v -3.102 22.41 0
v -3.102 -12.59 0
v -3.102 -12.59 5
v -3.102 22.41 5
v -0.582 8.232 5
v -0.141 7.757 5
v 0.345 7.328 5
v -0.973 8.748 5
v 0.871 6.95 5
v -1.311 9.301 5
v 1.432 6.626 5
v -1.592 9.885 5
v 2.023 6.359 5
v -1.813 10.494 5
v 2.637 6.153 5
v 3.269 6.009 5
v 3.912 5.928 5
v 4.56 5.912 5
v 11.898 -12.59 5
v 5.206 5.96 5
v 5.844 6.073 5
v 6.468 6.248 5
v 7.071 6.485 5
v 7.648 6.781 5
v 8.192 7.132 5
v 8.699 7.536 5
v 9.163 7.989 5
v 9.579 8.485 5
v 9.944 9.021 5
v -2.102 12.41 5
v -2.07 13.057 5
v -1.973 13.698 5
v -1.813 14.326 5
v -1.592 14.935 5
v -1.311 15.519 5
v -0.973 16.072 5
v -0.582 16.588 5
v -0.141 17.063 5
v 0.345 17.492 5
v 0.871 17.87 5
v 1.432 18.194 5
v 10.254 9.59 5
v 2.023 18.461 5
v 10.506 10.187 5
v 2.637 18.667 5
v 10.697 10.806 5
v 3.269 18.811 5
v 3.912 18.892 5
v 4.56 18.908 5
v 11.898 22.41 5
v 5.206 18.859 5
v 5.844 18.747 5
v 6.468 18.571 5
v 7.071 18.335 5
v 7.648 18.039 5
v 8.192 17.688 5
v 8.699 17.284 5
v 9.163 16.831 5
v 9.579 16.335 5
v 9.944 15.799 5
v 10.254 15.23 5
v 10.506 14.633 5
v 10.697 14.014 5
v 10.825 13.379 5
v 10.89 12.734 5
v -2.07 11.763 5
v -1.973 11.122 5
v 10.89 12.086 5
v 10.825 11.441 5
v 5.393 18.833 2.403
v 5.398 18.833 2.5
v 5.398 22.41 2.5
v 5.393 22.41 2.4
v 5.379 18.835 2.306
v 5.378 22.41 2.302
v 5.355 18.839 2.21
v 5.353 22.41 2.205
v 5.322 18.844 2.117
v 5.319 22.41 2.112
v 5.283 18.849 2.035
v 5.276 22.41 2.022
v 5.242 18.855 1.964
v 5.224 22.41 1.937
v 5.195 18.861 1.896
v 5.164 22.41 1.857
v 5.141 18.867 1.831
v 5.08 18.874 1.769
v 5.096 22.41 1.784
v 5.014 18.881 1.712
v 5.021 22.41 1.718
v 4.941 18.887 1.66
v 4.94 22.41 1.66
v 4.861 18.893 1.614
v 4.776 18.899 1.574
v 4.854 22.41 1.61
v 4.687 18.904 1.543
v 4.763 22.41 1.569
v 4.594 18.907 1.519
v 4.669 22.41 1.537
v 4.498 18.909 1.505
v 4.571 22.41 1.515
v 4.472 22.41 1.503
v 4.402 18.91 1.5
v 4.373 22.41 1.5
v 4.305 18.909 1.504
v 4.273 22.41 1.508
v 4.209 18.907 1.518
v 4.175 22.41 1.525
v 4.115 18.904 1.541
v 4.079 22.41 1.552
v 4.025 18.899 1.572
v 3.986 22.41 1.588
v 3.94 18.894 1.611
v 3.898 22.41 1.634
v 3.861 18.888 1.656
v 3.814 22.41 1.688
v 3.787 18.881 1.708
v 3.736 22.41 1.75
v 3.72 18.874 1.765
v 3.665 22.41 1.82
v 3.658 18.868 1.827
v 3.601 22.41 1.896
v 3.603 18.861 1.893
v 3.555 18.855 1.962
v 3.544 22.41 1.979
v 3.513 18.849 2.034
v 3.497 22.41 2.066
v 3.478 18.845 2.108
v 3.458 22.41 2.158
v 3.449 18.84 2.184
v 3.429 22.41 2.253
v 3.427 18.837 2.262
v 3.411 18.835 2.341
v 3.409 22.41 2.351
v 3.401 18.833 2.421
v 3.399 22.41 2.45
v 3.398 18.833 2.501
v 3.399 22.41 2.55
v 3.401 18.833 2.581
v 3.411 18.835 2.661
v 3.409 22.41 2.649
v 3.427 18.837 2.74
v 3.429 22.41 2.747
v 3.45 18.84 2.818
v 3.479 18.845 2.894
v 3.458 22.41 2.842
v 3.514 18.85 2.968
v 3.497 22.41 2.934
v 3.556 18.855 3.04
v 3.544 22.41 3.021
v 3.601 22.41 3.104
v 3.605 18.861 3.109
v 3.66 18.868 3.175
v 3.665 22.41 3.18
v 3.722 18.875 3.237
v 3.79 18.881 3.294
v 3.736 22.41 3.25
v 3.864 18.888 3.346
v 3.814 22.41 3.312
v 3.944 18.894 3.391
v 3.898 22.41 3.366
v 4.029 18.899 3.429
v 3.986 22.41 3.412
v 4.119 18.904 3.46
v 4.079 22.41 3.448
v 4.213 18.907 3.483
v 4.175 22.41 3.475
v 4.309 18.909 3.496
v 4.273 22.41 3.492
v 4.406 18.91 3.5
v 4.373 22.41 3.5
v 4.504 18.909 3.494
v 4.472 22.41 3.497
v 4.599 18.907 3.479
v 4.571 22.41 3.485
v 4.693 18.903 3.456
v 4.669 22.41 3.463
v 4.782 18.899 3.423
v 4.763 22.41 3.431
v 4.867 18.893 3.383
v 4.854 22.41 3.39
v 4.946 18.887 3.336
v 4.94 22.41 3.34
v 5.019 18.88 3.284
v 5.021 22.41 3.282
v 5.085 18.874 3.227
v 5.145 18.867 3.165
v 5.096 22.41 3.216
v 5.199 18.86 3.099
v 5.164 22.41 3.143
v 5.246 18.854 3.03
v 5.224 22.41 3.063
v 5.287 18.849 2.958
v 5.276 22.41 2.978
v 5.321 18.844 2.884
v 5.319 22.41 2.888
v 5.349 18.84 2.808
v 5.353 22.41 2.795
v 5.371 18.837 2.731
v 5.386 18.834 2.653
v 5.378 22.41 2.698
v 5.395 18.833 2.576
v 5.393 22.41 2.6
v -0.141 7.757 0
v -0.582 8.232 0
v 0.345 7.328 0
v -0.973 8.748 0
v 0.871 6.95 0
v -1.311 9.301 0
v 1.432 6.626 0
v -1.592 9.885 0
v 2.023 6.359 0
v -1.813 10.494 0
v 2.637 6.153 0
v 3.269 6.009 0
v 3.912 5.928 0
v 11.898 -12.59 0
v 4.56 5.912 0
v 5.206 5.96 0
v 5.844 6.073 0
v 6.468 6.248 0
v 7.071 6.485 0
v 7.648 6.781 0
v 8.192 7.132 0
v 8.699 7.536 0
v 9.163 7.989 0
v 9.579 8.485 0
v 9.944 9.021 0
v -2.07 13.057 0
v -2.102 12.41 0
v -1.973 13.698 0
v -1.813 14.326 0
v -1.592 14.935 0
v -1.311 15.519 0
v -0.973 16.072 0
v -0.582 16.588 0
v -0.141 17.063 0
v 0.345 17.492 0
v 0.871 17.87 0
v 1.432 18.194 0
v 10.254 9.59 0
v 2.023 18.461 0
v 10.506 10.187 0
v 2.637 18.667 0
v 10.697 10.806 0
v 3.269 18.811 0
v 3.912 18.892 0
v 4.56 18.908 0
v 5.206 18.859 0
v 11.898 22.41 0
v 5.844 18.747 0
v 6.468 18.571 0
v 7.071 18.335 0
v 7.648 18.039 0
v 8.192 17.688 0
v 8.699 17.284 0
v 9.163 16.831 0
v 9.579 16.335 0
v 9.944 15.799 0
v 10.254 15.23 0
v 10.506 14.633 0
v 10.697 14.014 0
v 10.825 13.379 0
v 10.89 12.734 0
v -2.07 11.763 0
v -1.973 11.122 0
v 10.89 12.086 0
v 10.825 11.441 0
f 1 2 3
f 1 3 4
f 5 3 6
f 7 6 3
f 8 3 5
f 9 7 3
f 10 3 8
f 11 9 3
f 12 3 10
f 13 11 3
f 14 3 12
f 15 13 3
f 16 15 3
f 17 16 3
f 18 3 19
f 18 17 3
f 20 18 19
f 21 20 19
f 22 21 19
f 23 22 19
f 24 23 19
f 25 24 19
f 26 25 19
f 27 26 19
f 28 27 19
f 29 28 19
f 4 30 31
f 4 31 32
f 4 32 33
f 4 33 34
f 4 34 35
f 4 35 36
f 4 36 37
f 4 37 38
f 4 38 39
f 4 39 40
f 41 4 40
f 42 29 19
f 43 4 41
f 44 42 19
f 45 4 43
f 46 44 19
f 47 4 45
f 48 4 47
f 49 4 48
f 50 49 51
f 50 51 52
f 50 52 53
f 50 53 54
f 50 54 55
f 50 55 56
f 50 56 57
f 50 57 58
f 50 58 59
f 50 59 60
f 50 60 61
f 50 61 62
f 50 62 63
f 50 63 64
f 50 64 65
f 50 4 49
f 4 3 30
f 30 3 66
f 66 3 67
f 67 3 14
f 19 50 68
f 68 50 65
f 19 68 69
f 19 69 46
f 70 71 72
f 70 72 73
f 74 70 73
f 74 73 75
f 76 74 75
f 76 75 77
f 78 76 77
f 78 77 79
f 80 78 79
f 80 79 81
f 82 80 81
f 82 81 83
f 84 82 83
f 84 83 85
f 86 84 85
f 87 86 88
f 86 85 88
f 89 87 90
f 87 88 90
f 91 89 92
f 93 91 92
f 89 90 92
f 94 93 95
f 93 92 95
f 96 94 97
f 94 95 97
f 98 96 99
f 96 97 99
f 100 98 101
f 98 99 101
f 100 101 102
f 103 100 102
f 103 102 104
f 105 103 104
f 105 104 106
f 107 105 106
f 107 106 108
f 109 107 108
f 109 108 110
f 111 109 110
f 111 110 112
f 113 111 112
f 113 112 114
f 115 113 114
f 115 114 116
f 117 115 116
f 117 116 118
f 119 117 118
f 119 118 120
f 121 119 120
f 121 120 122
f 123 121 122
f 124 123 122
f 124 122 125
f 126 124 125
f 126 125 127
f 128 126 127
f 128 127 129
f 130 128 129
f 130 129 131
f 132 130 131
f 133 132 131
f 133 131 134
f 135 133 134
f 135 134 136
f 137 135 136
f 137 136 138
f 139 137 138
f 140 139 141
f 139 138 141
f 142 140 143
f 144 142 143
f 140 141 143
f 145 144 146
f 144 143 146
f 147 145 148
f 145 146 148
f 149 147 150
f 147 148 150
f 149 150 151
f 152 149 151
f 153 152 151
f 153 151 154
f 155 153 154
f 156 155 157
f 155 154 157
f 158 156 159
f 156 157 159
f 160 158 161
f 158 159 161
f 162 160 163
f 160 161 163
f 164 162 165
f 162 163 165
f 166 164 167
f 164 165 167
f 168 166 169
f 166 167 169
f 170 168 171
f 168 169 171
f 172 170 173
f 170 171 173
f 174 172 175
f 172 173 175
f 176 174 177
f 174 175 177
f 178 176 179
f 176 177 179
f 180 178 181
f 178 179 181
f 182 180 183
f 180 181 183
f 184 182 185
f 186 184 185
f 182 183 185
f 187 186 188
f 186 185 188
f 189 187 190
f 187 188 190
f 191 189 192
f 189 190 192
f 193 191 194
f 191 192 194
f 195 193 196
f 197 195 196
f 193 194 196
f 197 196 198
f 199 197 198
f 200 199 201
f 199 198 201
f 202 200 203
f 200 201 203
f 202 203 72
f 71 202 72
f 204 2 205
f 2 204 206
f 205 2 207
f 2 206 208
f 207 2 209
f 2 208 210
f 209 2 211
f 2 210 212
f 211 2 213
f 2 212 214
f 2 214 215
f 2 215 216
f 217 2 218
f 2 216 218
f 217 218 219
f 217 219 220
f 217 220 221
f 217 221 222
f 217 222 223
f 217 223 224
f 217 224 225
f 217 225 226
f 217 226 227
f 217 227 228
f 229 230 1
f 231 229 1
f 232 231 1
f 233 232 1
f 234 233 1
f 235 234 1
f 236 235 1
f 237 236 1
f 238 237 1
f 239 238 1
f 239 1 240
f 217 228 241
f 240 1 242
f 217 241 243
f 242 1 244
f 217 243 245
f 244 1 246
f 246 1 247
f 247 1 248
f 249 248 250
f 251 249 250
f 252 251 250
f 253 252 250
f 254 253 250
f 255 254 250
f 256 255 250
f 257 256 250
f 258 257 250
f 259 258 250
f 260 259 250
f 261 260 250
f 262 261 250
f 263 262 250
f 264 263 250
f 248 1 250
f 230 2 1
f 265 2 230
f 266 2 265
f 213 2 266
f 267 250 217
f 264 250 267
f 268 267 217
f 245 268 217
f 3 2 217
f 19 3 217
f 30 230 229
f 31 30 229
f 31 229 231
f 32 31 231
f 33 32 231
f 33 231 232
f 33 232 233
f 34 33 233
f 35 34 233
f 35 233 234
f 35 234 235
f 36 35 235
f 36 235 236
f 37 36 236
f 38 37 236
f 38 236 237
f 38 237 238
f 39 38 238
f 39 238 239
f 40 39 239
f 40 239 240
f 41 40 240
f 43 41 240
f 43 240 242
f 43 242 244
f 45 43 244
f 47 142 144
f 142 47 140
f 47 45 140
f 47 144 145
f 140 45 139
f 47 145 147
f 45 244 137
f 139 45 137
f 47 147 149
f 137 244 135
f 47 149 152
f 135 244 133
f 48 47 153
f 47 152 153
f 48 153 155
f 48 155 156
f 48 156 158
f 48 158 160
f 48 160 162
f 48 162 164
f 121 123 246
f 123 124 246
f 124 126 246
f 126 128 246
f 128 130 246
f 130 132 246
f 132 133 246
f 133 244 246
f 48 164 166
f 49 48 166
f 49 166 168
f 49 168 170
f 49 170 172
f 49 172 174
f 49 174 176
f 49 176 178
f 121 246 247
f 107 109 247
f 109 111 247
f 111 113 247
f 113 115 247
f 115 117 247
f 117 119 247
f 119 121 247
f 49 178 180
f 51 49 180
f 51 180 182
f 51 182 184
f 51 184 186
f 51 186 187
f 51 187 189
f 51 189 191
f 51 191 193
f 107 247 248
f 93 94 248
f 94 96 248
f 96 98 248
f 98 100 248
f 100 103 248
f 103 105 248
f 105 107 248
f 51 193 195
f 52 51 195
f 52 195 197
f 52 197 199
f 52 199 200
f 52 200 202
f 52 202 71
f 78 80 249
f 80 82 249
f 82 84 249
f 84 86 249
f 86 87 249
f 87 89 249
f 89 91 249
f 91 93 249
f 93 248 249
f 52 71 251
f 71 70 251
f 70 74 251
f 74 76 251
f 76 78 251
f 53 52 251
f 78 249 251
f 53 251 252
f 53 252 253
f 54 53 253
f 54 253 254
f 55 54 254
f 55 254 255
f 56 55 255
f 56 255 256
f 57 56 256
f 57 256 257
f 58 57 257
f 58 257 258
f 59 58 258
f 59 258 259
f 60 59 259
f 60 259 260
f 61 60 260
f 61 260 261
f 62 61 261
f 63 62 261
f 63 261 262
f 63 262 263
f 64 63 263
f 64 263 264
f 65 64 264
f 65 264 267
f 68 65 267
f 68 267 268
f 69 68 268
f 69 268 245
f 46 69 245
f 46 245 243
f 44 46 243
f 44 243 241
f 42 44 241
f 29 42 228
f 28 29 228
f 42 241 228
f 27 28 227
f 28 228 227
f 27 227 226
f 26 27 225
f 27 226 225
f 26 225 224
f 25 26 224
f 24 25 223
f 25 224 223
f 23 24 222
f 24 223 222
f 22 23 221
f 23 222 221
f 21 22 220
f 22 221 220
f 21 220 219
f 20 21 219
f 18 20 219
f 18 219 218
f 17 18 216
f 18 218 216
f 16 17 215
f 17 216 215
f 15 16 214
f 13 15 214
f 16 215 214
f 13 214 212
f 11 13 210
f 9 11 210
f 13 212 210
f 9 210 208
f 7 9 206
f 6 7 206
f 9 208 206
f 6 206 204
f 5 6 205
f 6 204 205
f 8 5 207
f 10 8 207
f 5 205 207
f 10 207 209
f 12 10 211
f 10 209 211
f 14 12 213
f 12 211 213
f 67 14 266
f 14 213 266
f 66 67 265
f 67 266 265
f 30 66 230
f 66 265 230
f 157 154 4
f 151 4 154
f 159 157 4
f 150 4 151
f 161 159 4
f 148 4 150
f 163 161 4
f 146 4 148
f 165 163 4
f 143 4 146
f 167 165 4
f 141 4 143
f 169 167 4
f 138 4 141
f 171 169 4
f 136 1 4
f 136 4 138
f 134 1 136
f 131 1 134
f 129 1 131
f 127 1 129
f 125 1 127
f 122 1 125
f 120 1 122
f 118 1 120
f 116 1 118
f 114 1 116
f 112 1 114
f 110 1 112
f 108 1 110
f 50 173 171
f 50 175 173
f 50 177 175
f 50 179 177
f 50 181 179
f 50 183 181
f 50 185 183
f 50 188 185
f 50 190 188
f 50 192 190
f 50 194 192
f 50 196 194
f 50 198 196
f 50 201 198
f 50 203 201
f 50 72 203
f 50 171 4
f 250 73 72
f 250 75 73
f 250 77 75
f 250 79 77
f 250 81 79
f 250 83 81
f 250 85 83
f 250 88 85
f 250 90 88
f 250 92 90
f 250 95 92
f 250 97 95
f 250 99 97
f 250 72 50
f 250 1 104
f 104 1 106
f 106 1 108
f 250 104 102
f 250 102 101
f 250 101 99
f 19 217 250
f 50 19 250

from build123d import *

# Parameters (mm, degrees)
SKETCH1_W           = 15
SKETCH1_H           = 35
BOSS_EXTRUDE1_DEPTH = 5
SKETCH2_R           = 6.5
CUT_EXTRUDE1_DEPTH  = 5
CUT_EXTRUDE2_REACH  = 37
SKETCH3_R           = 1


with BuildPart() as part:
    # Sketch1 → Boss-Extrude1 (new body)
    with BuildSketch(Plane.XY):
        with Locations((4.397758993, 4.909943839)):
            Rectangle(SKETCH1_W, SKETCH1_H)
    extrude(amount=BOSS_EXTRUDE1_DEPTH)

    # Sketch2 → Cut-Extrude1 (cut)
    with BuildSketch(Plane(origin=(0, 0, 0), x_dir=(-1, 0, 0), z_dir=(0, 0, -1))):
        with Locations((-4.397758993, 12.409943839)):
            Circle(SKETCH2_R)
    extrude(amount=-CUT_EXTRUDE1_DEPTH, mode=Mode.SUBTRACT)

    # Sketch3 → Cut-Extrude2 (cut, up to next)
    with BuildSketch(Plane(origin=(0, 22.409943839, 0), x_dir=(1, 0, 0), z_dir=(0, 1, 0)), mode=Mode.PRIVATE) as cut_extrude2_sk1:
        with Locations((4.397758993, -2.5)):
            Circle(SKETCH3_R)
    cut_extrude2_tool1 = extrude(cut_extrude2_sk1.sketch, amount=-CUT_EXTRUDE2_REACH, mode=Mode.PRIVATE) & part.part
    add(cut_extrude2_tool1.solids().sort_by_distance((4.397759, 22.409944, 2.5))[0], mode=Mode.SUBTRACT)


solid = part.part
